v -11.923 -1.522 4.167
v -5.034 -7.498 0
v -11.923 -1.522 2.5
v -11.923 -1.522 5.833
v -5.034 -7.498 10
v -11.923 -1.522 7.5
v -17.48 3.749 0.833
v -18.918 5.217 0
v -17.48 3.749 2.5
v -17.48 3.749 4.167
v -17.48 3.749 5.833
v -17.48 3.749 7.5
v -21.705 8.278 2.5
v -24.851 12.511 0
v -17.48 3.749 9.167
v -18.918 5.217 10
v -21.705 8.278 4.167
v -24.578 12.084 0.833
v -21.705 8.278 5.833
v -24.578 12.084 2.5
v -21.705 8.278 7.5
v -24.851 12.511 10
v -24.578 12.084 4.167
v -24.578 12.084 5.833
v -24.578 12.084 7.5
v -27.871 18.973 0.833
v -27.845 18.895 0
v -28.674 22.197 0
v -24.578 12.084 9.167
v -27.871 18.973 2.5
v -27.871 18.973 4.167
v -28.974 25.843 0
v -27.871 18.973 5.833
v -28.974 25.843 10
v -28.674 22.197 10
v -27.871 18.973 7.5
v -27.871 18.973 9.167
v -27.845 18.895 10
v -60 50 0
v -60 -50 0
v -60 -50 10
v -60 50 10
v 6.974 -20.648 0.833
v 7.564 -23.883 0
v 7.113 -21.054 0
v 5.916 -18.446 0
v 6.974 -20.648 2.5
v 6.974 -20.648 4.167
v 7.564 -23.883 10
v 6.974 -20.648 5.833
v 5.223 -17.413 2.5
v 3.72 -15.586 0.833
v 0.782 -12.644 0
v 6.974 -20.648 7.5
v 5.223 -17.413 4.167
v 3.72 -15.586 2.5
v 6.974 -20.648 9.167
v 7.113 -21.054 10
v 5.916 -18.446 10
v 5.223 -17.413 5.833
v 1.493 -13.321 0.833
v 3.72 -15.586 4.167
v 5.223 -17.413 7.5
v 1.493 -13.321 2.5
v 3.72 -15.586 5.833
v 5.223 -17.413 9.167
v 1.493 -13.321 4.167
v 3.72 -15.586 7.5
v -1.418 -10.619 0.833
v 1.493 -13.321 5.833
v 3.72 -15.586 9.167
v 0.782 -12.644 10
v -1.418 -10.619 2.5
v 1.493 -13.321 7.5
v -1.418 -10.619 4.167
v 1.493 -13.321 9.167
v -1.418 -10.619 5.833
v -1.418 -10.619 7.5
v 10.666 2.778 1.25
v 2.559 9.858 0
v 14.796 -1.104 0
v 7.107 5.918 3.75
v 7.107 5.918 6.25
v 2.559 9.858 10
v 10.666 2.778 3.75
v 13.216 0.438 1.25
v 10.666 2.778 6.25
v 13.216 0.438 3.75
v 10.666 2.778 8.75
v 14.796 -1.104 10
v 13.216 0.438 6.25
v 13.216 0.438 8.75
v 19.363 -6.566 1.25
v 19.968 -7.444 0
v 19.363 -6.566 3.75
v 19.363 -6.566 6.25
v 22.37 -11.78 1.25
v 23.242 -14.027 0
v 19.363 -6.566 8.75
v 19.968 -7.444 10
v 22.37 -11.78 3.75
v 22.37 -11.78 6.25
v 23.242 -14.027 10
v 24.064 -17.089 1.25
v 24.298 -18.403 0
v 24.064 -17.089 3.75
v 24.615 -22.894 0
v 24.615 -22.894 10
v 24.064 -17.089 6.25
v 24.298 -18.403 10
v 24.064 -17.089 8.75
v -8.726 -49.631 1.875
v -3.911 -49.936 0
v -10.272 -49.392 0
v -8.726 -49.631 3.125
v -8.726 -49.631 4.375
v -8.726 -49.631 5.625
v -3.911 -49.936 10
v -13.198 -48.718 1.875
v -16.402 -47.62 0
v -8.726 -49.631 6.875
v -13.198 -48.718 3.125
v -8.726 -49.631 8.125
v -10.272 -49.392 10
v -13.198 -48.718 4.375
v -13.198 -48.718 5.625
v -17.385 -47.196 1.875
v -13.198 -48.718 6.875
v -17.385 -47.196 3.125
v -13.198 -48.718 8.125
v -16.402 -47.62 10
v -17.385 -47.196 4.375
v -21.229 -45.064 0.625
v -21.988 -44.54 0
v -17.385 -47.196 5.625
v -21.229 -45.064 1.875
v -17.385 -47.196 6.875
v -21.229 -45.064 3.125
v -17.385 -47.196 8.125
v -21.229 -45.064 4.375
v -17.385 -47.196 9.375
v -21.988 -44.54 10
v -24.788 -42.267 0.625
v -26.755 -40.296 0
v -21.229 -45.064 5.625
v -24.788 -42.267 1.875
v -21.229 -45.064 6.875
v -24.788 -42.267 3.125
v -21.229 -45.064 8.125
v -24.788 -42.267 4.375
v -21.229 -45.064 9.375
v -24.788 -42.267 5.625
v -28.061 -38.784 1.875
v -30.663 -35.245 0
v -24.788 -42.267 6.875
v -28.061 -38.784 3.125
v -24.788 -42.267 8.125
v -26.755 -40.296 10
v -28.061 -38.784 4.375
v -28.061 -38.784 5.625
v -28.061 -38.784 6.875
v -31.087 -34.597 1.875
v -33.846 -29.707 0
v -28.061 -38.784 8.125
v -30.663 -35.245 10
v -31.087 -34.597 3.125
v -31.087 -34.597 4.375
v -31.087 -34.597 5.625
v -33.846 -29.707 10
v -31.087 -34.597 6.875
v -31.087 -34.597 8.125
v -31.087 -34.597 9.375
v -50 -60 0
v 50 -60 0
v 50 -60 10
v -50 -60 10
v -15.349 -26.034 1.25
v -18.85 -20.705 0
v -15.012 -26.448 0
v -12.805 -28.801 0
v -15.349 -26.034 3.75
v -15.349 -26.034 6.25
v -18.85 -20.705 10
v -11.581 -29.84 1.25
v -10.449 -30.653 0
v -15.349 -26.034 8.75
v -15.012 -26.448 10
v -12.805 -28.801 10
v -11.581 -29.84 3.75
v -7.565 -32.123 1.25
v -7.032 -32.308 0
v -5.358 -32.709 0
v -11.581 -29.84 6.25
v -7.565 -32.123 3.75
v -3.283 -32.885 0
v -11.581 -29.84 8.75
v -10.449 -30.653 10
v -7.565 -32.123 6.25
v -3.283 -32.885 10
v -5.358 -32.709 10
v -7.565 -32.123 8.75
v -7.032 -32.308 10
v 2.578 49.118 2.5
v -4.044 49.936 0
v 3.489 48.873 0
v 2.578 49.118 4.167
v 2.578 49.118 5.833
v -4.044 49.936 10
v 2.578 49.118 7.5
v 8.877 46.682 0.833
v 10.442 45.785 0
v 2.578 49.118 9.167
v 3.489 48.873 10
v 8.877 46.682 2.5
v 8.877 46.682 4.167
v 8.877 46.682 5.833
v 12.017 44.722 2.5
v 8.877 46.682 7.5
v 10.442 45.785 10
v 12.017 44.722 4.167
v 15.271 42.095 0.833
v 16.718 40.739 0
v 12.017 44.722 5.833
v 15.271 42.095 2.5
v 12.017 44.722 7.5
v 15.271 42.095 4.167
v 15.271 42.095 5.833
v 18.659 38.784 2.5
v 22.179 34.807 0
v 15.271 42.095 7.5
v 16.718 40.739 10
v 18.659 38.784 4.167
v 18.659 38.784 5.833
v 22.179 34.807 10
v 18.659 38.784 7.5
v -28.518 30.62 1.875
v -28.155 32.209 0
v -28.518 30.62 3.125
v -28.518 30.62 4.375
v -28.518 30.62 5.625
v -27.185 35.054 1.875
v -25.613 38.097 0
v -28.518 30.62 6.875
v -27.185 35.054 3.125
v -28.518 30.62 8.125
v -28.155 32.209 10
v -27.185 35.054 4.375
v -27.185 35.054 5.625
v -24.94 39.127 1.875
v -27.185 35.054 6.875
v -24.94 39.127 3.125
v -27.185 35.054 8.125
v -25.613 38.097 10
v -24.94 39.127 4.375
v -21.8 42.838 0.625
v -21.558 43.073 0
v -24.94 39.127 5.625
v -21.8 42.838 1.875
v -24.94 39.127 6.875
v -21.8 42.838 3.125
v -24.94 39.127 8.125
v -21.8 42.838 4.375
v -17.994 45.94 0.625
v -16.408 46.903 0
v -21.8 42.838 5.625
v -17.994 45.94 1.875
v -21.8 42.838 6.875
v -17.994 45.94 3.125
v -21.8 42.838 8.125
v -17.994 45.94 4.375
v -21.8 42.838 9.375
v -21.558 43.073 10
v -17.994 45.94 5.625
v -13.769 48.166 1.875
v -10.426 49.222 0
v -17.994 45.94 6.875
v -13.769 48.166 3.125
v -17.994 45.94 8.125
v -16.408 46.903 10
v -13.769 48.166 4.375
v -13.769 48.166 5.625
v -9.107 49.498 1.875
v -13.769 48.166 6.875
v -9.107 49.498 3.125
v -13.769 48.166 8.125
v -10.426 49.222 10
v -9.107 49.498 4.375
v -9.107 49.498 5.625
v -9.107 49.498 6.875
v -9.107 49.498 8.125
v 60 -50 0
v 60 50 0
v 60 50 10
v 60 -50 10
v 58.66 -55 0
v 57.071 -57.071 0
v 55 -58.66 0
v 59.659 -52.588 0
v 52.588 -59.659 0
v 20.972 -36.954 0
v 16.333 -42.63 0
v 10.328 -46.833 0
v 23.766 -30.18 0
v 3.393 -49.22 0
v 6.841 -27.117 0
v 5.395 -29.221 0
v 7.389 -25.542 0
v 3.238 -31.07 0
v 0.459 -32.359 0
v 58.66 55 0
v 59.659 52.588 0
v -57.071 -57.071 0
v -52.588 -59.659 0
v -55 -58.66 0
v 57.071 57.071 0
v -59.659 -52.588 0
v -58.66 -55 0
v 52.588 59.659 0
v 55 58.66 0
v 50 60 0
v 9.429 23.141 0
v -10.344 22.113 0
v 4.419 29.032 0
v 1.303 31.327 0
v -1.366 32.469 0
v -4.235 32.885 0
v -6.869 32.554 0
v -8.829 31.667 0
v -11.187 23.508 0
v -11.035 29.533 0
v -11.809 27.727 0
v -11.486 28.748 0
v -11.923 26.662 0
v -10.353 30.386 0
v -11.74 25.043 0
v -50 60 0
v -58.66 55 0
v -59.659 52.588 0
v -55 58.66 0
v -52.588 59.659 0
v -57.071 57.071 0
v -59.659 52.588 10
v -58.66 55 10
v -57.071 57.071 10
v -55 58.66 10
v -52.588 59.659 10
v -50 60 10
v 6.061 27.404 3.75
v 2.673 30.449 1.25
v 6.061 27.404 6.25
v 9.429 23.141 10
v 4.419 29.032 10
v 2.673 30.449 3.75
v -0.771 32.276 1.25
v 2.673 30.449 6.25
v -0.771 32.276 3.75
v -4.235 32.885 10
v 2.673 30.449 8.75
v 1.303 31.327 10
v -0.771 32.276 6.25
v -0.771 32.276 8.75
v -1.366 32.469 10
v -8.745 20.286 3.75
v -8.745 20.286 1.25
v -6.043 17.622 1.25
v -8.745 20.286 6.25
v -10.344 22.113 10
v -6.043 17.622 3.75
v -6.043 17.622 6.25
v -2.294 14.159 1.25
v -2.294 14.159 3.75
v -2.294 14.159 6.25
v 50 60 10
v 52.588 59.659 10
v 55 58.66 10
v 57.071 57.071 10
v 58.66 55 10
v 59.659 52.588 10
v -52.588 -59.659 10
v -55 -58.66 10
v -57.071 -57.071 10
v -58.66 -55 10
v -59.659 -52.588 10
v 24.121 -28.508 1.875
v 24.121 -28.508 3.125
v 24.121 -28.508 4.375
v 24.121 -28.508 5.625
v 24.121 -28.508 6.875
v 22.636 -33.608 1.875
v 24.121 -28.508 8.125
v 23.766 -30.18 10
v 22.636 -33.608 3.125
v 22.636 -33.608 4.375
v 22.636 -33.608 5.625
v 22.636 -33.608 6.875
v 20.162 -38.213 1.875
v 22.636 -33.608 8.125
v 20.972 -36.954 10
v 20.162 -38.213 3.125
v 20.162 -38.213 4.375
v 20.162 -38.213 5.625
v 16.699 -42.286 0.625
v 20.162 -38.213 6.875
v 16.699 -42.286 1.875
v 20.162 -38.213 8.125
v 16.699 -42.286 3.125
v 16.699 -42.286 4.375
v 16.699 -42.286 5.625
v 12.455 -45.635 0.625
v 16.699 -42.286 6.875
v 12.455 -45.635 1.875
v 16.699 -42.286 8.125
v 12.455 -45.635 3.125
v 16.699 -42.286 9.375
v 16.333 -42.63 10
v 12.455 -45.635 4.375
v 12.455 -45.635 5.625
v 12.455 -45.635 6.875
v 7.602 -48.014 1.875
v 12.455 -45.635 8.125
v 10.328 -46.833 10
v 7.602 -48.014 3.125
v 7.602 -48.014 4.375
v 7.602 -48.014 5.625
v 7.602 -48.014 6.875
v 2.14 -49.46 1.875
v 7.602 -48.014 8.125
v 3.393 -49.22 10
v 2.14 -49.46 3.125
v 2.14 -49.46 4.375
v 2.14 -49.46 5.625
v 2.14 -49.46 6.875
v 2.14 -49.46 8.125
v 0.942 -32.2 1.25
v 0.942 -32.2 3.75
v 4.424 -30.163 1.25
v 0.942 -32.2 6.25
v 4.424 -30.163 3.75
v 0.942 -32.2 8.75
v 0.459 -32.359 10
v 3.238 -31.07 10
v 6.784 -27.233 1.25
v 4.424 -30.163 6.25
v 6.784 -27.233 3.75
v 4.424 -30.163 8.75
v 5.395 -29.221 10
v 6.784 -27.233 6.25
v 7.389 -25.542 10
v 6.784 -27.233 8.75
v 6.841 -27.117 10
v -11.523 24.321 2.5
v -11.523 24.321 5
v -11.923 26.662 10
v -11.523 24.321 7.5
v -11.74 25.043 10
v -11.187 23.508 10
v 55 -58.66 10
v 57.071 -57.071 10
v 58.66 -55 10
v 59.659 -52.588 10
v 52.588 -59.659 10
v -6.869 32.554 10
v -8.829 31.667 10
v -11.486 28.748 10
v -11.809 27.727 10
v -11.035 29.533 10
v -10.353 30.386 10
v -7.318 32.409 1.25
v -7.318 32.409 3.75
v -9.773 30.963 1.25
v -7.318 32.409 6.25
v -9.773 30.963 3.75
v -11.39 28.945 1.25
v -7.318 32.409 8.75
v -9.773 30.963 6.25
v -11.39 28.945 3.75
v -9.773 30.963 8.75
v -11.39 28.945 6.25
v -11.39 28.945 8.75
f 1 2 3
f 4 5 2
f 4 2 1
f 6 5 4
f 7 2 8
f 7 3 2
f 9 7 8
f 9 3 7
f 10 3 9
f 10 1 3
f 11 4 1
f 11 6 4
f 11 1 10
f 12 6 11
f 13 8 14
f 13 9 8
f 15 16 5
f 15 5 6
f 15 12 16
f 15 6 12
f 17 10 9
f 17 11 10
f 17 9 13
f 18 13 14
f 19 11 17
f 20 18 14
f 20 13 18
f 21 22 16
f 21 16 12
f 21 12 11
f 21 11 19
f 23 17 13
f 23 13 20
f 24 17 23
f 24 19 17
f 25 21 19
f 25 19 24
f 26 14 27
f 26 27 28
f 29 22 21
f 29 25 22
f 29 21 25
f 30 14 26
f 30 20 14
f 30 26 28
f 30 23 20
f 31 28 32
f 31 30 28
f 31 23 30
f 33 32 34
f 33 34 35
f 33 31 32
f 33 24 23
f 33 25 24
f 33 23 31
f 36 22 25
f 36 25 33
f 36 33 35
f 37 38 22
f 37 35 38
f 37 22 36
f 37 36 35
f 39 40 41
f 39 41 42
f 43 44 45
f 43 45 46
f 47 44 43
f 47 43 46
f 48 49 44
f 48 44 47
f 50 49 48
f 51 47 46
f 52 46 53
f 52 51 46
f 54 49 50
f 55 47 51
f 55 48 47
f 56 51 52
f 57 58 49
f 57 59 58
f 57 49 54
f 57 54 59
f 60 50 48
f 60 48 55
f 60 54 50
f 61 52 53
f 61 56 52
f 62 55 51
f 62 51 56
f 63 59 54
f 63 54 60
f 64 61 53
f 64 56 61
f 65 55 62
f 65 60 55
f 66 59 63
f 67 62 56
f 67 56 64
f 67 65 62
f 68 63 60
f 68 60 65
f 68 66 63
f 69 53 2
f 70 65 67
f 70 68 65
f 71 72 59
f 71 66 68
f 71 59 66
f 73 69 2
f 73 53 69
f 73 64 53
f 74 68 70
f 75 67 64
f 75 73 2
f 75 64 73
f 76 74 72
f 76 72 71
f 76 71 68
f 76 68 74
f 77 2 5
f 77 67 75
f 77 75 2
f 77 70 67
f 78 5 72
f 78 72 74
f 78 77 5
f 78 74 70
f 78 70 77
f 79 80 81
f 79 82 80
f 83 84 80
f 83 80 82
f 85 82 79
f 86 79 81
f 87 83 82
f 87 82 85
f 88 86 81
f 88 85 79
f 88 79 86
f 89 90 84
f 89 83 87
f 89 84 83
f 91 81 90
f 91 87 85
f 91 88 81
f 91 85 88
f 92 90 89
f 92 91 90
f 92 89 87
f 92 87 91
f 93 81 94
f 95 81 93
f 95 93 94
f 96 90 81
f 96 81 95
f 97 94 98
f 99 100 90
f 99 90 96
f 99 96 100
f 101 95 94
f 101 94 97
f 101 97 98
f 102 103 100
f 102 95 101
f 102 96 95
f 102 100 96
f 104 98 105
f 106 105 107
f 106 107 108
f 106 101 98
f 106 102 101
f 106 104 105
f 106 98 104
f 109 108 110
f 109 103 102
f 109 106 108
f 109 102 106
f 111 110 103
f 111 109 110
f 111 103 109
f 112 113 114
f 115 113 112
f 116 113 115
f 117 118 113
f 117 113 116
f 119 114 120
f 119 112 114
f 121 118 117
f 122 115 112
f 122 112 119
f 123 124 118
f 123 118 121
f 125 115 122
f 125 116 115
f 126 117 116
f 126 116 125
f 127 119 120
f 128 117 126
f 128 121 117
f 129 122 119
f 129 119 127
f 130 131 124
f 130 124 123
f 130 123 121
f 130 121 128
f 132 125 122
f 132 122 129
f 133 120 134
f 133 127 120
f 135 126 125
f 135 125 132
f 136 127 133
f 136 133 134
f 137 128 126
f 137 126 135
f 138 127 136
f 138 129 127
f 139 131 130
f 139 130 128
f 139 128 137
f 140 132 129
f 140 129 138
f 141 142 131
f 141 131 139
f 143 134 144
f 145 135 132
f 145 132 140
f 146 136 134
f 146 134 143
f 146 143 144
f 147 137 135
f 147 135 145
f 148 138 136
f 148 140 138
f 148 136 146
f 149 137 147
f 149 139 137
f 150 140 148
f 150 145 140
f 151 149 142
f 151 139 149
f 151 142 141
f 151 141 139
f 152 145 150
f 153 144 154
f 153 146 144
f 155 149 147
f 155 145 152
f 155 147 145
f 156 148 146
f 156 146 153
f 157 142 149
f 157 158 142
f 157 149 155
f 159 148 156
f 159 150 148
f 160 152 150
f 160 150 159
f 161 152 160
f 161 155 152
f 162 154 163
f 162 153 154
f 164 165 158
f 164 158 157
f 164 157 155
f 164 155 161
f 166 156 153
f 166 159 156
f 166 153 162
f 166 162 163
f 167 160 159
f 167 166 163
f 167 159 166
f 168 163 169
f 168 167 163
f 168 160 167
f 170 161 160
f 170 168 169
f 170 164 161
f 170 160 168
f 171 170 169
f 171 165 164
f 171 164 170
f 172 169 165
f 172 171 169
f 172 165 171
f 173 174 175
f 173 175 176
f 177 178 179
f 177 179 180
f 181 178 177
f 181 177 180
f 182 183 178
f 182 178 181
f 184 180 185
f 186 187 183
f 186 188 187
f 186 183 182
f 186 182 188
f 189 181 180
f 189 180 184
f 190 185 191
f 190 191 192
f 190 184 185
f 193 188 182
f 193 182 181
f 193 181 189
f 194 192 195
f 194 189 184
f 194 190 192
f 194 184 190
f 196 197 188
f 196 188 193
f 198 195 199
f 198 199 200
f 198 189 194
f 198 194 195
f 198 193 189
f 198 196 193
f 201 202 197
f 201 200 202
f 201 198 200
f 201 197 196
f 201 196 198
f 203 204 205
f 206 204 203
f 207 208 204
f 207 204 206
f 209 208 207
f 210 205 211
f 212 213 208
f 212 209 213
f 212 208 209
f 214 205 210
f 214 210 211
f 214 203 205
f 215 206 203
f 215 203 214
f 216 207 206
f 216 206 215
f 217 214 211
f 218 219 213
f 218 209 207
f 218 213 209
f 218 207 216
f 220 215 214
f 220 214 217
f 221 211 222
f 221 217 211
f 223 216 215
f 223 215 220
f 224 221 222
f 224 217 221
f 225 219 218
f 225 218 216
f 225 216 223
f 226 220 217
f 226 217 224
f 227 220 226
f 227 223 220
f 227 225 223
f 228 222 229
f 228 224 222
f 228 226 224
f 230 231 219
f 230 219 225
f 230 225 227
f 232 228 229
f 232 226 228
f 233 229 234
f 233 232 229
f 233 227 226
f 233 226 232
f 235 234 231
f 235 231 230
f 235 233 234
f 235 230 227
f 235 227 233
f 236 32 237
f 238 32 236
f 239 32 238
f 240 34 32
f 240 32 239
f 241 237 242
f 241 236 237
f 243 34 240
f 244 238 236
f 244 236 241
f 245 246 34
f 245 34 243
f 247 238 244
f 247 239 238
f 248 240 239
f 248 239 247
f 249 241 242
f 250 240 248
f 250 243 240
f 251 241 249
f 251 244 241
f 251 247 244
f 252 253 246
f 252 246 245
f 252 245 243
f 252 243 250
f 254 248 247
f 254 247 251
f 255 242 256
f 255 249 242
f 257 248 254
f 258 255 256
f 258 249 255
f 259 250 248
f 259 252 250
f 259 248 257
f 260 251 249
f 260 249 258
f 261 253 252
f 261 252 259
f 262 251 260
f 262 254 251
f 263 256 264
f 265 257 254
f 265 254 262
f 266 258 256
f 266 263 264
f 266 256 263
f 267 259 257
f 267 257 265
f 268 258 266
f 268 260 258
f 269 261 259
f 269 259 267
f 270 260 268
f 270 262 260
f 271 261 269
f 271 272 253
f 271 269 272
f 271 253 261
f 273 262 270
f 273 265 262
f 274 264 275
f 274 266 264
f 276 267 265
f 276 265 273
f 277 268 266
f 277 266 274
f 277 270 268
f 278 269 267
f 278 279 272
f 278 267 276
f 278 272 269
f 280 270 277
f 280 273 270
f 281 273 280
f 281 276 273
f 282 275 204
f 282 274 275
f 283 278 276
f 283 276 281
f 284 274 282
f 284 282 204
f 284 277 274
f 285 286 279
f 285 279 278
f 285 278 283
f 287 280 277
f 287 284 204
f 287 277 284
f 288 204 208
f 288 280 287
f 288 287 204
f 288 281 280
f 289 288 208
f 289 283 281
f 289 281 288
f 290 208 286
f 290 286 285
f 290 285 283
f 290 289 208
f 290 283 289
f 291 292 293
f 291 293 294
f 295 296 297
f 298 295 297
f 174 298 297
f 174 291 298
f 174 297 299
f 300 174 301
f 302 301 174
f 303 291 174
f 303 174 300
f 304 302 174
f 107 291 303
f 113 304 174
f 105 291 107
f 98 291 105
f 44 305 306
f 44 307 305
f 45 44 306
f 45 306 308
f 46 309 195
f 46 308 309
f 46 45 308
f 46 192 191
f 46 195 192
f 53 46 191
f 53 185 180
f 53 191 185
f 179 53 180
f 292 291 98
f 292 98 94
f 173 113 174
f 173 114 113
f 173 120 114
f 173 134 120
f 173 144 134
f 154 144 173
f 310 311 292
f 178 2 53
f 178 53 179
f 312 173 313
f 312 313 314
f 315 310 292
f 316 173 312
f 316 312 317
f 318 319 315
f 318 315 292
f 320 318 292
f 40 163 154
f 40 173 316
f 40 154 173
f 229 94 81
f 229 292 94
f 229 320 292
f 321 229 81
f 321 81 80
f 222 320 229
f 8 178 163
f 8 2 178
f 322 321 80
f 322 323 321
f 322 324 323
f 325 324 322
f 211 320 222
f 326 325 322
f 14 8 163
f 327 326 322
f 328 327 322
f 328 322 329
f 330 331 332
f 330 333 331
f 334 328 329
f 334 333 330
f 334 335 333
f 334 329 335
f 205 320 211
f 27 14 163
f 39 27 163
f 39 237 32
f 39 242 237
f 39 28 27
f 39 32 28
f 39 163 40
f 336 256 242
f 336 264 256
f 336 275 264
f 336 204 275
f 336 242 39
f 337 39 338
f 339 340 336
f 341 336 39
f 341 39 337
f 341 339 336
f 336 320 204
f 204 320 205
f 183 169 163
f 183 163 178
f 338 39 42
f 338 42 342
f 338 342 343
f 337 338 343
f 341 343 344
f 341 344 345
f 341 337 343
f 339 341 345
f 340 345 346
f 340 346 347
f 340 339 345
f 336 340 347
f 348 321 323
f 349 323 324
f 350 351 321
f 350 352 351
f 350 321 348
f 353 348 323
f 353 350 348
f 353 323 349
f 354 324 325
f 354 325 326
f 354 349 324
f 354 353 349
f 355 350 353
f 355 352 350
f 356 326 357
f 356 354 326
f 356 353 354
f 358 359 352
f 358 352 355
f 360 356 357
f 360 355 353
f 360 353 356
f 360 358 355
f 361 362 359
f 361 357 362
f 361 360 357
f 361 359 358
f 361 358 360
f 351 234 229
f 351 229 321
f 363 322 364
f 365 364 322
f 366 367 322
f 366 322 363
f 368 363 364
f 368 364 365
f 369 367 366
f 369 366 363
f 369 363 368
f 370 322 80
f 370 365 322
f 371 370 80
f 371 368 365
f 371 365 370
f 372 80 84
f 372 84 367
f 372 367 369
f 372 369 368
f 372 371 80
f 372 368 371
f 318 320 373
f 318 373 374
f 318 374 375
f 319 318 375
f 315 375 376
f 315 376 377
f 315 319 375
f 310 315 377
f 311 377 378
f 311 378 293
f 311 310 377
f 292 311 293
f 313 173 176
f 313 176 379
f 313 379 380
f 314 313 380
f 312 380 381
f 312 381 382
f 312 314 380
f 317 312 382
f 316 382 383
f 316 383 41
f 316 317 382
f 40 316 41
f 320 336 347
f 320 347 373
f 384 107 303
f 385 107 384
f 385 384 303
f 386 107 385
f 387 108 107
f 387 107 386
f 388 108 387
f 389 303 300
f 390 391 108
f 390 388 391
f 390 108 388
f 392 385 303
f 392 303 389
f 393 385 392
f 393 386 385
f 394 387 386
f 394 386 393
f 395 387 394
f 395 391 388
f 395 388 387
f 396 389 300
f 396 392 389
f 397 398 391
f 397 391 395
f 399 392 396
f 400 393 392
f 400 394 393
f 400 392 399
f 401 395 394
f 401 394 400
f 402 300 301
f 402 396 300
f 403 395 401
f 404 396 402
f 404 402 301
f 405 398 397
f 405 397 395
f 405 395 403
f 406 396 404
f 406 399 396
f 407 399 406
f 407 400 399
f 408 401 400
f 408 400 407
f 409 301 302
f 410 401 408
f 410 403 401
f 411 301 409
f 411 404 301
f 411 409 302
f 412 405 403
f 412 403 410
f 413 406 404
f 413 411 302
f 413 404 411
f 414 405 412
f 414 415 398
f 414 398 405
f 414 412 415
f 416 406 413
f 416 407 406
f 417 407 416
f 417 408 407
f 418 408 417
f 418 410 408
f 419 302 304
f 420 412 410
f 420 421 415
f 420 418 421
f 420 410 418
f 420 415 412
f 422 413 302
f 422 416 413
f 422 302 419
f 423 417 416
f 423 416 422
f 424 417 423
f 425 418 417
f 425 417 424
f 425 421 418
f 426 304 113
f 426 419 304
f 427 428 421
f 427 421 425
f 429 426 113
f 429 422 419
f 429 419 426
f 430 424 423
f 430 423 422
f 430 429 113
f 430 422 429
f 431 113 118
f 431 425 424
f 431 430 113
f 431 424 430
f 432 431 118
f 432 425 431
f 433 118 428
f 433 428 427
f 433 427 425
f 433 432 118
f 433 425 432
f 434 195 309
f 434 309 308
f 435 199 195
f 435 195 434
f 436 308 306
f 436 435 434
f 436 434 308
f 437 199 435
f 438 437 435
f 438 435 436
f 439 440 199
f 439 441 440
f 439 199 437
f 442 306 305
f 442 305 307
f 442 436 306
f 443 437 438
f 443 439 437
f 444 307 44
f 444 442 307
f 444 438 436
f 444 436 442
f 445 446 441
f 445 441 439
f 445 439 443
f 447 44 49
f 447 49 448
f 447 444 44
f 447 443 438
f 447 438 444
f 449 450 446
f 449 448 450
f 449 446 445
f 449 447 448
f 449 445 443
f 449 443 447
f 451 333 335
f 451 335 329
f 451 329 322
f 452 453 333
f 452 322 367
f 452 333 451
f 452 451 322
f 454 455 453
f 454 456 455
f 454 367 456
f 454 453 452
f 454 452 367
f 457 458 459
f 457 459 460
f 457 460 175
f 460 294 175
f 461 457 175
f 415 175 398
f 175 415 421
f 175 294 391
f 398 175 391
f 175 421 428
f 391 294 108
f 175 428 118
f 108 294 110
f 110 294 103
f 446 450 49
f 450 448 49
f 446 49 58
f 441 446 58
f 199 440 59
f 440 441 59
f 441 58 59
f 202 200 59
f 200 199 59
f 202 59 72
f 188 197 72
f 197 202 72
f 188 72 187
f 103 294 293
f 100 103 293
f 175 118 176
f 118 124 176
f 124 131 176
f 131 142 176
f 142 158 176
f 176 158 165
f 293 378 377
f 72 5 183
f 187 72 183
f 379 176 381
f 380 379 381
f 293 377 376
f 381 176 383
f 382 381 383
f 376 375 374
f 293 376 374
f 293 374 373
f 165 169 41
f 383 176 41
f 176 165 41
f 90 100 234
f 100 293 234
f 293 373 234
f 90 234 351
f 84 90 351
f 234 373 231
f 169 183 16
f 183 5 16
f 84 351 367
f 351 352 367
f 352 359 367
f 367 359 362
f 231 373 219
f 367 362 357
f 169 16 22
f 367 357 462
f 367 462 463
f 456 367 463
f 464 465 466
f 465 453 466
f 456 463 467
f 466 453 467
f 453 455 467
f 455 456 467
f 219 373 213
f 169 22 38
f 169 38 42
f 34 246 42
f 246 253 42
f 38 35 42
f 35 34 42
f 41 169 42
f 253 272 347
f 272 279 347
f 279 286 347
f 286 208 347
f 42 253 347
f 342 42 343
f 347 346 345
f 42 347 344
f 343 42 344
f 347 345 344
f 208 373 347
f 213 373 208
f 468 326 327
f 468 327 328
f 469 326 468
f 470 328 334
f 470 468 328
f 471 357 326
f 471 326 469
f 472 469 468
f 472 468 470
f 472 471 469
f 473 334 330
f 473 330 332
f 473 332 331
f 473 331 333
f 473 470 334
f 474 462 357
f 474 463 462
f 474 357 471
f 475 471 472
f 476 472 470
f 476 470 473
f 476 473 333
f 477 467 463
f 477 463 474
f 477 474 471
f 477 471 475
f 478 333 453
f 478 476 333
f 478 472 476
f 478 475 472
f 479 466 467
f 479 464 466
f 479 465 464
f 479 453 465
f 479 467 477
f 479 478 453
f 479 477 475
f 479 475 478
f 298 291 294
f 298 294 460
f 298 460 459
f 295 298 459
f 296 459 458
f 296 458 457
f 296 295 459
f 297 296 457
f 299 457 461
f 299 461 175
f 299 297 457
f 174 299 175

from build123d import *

# Parameters (mm, degrees)
BOSS_EXTRUDE1_DEPTH = 10
CUT_EXTRUDE32_DEPTH = 10


with BuildPart() as part:
    # Sketch1 → Boss-Extrude1 (new body)
    with BuildSketch(Plane.XY):
        with BuildLine():
            Line((-50, 60), (50, 60))
            ThreePointArc((50, 60), (57.071067812, 57.071067812), (60, 50))
            Line((60, 50), (60, -50))
            ThreePointArc((60, -50), (57.071067812, -57.071067812), (50, -60))
            Line((50, -60), (-50, -60))
            ThreePointArc((-50, -60), (-57.071067812, -57.071067812), (-60, -50))
            Line((-60, -50), (-60, 50))
            ThreePointArc((-60, 50), (-57.071067812, 57.071067812), (-50, 60))
        make_face()
    extrude(amount=BOSS_EXTRUDE1_DEPTH)

    # Sketch2 → Cut-Extrude32 (cut)
    with BuildSketch(Plane.XY.offset(10)):
        with BuildLine():
            Line((22.179487179, 34.806690705), (9.429086538, 23.141025641))
            add(Edge.make_bspline(
                [(9.429086538, 23.141025641), (8.882914048, 23.91145872), (7.834339031, 25.390582792), (6.134708299, 27.371164786), (4.442752271, 29.06074862), (2.742796004, 30.452275993), (1.019771731, 31.537292342), (-0.723329628, 32.305495903), (-2.476625945, 32.793850197), (-3.654570423, 32.854662056), (-4.234775641, 32.884615385)],
                knots=[0, 0, 0, 0, 1.299362458, 2.494594718, 3.587462134, 4.587049575, 5.512617175, 6.380583204, 7.202344345, 8, 8, 8, 8], degree=3))
            add(Edge.make_bspline(
                [(-4.234775641, 32.884615385), (-4.775974426, 32.865635582), (-5.820887089, 32.828990568), (-7.31048761, 32.464741869), (-8.632976167, 31.836102106), (-9.787062069, 31.01410273), (-10.701268375, 30.023784052), (-11.431191215, 28.98519439), (-11.842199109, 27.838826287), (-11.896295835, 27.05145443), (-11.923076923, 26.661658654)],
                knots=[0, 0, 0, 0, 1.185010067, 2.2879431, 3.333075148, 4.379039566, 5.372662701, 6.27520591, 7.14612461, 8, 8, 8, 8], degree=3))
            add(Edge.make_bspline(
                [(-11.923076923, 26.661658654), (-11.906294573, 26.266241849), (-11.872497251, 25.469927355), (-11.546061132, 24.302829291), (-11.054028691, 23.162438622), (-10.583871606, 22.468228557), (-10.343549679, 22.11338141)],
                knots=[0, 0, 0, 0, 0.967525499, 1.948461899, 2.951351359, 4, 4, 4, 4], degree=3))
            add(Edge.make_bspline(
                [(-10.343549679, 22.11338141), (-10.125071051, 21.837562436), (-9.622162103, 21.202663585), (-8.663217741, 20.197082772), (-7.458985017, 18.965158257), (-5.96312252, 17.549252313), (-4.237727617, 15.898443424), (-2.202826025, 14.077625518), (0.083008913, 12.030409979), (1.707727428, 10.604803211), (2.559094551, 9.857772436)],
                knots=[0, 0, 0, 0, 0.473873513, 1.090794244, 1.870441696, 2.795289791, 3.865433203, 5.087734844, 6.473946851, 8, 8, 8, 8], degree=3))
            add(Edge.make_bspline(
                [(2.559094551, 9.857772436), (3.358225064, 9.166165286), (4.874808752, 7.853638601), (7.032606174, 5.990717711), (8.92895073, 4.31469321), (10.591467834, 2.85071864), (11.994955347, 1.583433555), (13.145313536, 0.506780349), (14.056592075, -0.358280522), (14.574600568, -0.880777815), (14.795673077, -1.103766026)],
                knots=[0, 0, 0, 0, 1.543621617, 2.929473131, 4.163658386, 5.240097082, 6.164993805, 6.925417477, 7.541396219, 8, 8, 8, 8], degree=3))
            add(Edge.make_bspline(
                [(14.795673077, -1.103766026), (15.634376084, -2.011422303), (17.246657803, -3.756256423), (19.342055672, -6.460200571), (21.066635897, -9.099801404), (22.400803862, -11.724727295), (23.40842117, -14.372850698), (24.118804721, -17.109116699), (24.544258155, -19.96211756), (24.59149342, -21.908942364), (24.615384615, -22.893629808)],
                knots=[0, 0, 0, 0, 1.206664779, 2.319633467, 3.337109185, 4.282041471, 5.190008762, 6.099243693, 7.03861361, 8, 8, 8, 8], degree=3))
            add(Edge.make_bspline(
                [(24.615384615, -22.893629808), (24.598379474, -23.853086961), (24.565014754, -25.735577605), (24.156360918, -28.490322254), (23.573644532, -31.126732441), (22.672662774, -33.616120296), (21.574551543, -35.999348361), (20.197910517, -38.239293521), (18.581234396, -40.358624937), (16.728275333, -42.319456968), (14.67868258, -44.098776126), (12.480299564, -45.682768067), (10.111629387, -46.990555178), (7.592909595, -48.06742458), (4.925488401, -48.896843793), (2.112543508, -49.509861892), (-0.850227675, -49.877785692), (-2.876213304, -49.91624776), (-3.911258013, -49.935897436)],
                knots=[0, 0, 0, 0, 1.043214005, 2.046824704, 3.02475056, 3.976699089, 4.921714032, 5.875962561, 6.831408892, 7.817874052, 8.806269674, 9.781291748, 10.760897367, 11.74438705, 12.757449933, 13.795994037, 14.874007457, 16, 16, 16, 16], degree=3))
            add(Edge.make_bspline(
                [(-3.911258013, -49.935897436), (-4.723759295, -49.921483122), (-6.332977804, -49.892934513), (-8.704722601, -49.659858889), (-10.994910313, -49.283699628), (-13.200961249, -48.74455104), (-15.332814058, -48.061376655), (-17.390556291, -47.226905315), (-19.359982672, -46.228203026), (-21.255994813, -45.085807078), (-23.069375756, -43.759334902), (-24.82305499, -42.275905787), (-26.499613308, -40.612703931), (-28.107102878, -38.773662739), (-29.635238535, -36.753574491), (-31.134041642, -34.580572653), (-32.53690088, -32.214329262), (-33.403509434, -30.554390381), (-33.846153846, -29.706530449)],
                knots=[0, 0, 0, 0, 1.016823716, 2.013894106, 2.979844003, 3.91962641, 4.853723003, 5.779685073, 6.695824784, 7.614987388, 8.547259901, 9.504950863, 10.487499108, 11.500346958, 12.559593716, 13.656357062, 14.802919212, 16, 16, 16, 16], degree=3))
            Line((-33.846153846, -29.706530449), (-18.850160256, -20.705128205))
            add(Edge.make_bspline(
                [(-18.850160256, -20.705128205), (-18.296478254, -21.667560008), (-17.235022533, -23.512624029), (-15.436286582, -25.991701389), (-13.593573429, -28.114620785), (-11.664281196, -29.843859481), (-9.671869355, -31.202539621), (-7.606714094, -32.173546708), (-5.467364474, -32.774598996), (-4.010136703, -32.848001363), (-3.283253205, -32.884615385)],
                knots=[0, 0, 0, 0, 1.283663364, 2.460892379, 3.537111102, 4.529833553, 5.449777664, 6.316464042, 7.160231139, 8, 8, 8, 8], degree=3))
            add(Edge.make_bspline(
                [(-3.283253205, -32.884615385), (-2.543908622, -32.854714389), (-1.109472453, -32.796702103), (0.938001622, -32.26086011), (2.81520338, -31.41954887), (4.437842715, -30.219113746), (5.811791397, -28.83362916), (6.825844389, -27.292214207), (7.462879318, -25.624440438), (7.530229355, -24.465895073), (7.564102564, -23.883213141)],
                knots=[0, 0, 0, 0, 1.13588714, 2.203786484, 3.234766741, 4.283437687, 5.291419208, 6.222934724, 7.106237994, 8, 8, 8, 8], degree=3))
            add(Edge.make_bspline(
                [(7.564102564, -23.883213141), (7.532822042, -23.341122423), (7.469278655, -22.239917025), (7.001237654, -20.602601675), (6.26954681, -18.966030942), (5.403904944, -17.62367135), (4.523005953, -16.499750052), (3.68066783, -15.525923088), (2.654922822, -14.450014779), (1.448371765, -13.270671713), (0.076956347, -11.977511836), (-1.460478671, -10.570661777), (-3.181538547, -9.062514205), (-4.397987064, -8.035178979), (-5.034054487, -7.497996795)],
                knots=[0, 0, 0, 0, 0.916159276, 1.861089862, 2.860218735, 3.940849679, 4.552606315, 5.27541173, 6.11797699, 7.06649574, 8.129236253, 9.306560635, 10.591630461, 12, 12, 12, 12], degree=3))
            add(Edge.make_bspline(
                [(-5.034054487, -7.497996795), (-6.243243975, -6.474906536), (-8.564044597, -4.511286663), (-11.84363032, -1.611081927), (-14.798830707, 1.099425143), (-17.404121473, 3.653742339), (-19.692698053, 6.004697341), (-21.649061212, 8.171385505), (-23.251719411, 10.170519868), (-24.938171589, 12.538360741), (-26.540638342, 15.423737543), (-27.925624358, 18.895180326), (-28.824144829, 22.366182634), (-28.924811551, 24.696422404), (-28.974358974, 25.843349359)],
                knots=[0, 0, 0, 0, 1.345494975, 2.582412109, 3.71882943, 4.751509156, 5.681369928, 6.505683931, 7.230279997, 7.856715994, 8.973648664, 10.023341002, 11.027102913, 12, 12, 12, 12], degree=3))
            add(Edge.make_bspline(
                [(-28.974358974, 25.843349359), (-28.953752267, 26.656688395), (-28.91315484, 28.259053664), (-28.551019527, 30.61509832), (-28.009794504, 32.888483451), (-27.223780391, 35.070914712), (-26.203628979, 37.159658519), (-24.964694716, 39.164940152), (-23.487739299, 41.068303453), (-21.823310254, 42.868486626), (-19.989535587, 44.513649186), (-18.029914316, 45.965669991), (-15.955538071, 47.192067876), (-13.779096835, 48.209453974), (-11.487104107, 48.988198402), (-9.096444894, 49.540211269), (-6.60369023, 49.868530918), (-4.908172315, 49.913162165), (-4.044471154, 49.935897436)],
                knots=[0, 0, 0, 0, 1.010766082, 1.991317756, 2.957454644, 3.913069143, 4.869106762, 5.843196583, 6.838735724, 7.860187025, 8.887984031, 9.89767229, 10.887916223, 11.879572884, 12.879850636, 13.892031539, 14.926195476, 16, 16, 16, 16], degree=3))
            add(Edge.make_bspline(
                [(-4.044471154, 49.935897436), (-2.925157197, 49.894950547), (-0.695364756, 49.813379988), (2.601447679, 49.175524879), (5.821636228, 48.17243053), (8.416524509, 46.962307558), (10.481228679, 45.790060863), (12.063631555, 44.71080377), (13.673811657, 43.474456765), (15.324754087, 42.07712379), (16.98578178, 40.492477259), (18.704125696, 38.758240928), (20.456371299, 36.85942694), (21.595053116, 35.502923032), (22.179487179, 34.806690705)],
                knots=[0, 0, 0, 0, 1.282922637, 2.555718331, 3.837320111, 5.142675274, 5.830281639, 6.55870424, 7.337177975, 8.157850921, 9.037902056, 9.96903443, 10.957596896, 12, 12, 12, 12], degree=3))
        make_face()
    extrude(amount=-CUT_EXTRUDE32_DEPTH, mode=Mode.SUBTRACT)


solid = part.part
